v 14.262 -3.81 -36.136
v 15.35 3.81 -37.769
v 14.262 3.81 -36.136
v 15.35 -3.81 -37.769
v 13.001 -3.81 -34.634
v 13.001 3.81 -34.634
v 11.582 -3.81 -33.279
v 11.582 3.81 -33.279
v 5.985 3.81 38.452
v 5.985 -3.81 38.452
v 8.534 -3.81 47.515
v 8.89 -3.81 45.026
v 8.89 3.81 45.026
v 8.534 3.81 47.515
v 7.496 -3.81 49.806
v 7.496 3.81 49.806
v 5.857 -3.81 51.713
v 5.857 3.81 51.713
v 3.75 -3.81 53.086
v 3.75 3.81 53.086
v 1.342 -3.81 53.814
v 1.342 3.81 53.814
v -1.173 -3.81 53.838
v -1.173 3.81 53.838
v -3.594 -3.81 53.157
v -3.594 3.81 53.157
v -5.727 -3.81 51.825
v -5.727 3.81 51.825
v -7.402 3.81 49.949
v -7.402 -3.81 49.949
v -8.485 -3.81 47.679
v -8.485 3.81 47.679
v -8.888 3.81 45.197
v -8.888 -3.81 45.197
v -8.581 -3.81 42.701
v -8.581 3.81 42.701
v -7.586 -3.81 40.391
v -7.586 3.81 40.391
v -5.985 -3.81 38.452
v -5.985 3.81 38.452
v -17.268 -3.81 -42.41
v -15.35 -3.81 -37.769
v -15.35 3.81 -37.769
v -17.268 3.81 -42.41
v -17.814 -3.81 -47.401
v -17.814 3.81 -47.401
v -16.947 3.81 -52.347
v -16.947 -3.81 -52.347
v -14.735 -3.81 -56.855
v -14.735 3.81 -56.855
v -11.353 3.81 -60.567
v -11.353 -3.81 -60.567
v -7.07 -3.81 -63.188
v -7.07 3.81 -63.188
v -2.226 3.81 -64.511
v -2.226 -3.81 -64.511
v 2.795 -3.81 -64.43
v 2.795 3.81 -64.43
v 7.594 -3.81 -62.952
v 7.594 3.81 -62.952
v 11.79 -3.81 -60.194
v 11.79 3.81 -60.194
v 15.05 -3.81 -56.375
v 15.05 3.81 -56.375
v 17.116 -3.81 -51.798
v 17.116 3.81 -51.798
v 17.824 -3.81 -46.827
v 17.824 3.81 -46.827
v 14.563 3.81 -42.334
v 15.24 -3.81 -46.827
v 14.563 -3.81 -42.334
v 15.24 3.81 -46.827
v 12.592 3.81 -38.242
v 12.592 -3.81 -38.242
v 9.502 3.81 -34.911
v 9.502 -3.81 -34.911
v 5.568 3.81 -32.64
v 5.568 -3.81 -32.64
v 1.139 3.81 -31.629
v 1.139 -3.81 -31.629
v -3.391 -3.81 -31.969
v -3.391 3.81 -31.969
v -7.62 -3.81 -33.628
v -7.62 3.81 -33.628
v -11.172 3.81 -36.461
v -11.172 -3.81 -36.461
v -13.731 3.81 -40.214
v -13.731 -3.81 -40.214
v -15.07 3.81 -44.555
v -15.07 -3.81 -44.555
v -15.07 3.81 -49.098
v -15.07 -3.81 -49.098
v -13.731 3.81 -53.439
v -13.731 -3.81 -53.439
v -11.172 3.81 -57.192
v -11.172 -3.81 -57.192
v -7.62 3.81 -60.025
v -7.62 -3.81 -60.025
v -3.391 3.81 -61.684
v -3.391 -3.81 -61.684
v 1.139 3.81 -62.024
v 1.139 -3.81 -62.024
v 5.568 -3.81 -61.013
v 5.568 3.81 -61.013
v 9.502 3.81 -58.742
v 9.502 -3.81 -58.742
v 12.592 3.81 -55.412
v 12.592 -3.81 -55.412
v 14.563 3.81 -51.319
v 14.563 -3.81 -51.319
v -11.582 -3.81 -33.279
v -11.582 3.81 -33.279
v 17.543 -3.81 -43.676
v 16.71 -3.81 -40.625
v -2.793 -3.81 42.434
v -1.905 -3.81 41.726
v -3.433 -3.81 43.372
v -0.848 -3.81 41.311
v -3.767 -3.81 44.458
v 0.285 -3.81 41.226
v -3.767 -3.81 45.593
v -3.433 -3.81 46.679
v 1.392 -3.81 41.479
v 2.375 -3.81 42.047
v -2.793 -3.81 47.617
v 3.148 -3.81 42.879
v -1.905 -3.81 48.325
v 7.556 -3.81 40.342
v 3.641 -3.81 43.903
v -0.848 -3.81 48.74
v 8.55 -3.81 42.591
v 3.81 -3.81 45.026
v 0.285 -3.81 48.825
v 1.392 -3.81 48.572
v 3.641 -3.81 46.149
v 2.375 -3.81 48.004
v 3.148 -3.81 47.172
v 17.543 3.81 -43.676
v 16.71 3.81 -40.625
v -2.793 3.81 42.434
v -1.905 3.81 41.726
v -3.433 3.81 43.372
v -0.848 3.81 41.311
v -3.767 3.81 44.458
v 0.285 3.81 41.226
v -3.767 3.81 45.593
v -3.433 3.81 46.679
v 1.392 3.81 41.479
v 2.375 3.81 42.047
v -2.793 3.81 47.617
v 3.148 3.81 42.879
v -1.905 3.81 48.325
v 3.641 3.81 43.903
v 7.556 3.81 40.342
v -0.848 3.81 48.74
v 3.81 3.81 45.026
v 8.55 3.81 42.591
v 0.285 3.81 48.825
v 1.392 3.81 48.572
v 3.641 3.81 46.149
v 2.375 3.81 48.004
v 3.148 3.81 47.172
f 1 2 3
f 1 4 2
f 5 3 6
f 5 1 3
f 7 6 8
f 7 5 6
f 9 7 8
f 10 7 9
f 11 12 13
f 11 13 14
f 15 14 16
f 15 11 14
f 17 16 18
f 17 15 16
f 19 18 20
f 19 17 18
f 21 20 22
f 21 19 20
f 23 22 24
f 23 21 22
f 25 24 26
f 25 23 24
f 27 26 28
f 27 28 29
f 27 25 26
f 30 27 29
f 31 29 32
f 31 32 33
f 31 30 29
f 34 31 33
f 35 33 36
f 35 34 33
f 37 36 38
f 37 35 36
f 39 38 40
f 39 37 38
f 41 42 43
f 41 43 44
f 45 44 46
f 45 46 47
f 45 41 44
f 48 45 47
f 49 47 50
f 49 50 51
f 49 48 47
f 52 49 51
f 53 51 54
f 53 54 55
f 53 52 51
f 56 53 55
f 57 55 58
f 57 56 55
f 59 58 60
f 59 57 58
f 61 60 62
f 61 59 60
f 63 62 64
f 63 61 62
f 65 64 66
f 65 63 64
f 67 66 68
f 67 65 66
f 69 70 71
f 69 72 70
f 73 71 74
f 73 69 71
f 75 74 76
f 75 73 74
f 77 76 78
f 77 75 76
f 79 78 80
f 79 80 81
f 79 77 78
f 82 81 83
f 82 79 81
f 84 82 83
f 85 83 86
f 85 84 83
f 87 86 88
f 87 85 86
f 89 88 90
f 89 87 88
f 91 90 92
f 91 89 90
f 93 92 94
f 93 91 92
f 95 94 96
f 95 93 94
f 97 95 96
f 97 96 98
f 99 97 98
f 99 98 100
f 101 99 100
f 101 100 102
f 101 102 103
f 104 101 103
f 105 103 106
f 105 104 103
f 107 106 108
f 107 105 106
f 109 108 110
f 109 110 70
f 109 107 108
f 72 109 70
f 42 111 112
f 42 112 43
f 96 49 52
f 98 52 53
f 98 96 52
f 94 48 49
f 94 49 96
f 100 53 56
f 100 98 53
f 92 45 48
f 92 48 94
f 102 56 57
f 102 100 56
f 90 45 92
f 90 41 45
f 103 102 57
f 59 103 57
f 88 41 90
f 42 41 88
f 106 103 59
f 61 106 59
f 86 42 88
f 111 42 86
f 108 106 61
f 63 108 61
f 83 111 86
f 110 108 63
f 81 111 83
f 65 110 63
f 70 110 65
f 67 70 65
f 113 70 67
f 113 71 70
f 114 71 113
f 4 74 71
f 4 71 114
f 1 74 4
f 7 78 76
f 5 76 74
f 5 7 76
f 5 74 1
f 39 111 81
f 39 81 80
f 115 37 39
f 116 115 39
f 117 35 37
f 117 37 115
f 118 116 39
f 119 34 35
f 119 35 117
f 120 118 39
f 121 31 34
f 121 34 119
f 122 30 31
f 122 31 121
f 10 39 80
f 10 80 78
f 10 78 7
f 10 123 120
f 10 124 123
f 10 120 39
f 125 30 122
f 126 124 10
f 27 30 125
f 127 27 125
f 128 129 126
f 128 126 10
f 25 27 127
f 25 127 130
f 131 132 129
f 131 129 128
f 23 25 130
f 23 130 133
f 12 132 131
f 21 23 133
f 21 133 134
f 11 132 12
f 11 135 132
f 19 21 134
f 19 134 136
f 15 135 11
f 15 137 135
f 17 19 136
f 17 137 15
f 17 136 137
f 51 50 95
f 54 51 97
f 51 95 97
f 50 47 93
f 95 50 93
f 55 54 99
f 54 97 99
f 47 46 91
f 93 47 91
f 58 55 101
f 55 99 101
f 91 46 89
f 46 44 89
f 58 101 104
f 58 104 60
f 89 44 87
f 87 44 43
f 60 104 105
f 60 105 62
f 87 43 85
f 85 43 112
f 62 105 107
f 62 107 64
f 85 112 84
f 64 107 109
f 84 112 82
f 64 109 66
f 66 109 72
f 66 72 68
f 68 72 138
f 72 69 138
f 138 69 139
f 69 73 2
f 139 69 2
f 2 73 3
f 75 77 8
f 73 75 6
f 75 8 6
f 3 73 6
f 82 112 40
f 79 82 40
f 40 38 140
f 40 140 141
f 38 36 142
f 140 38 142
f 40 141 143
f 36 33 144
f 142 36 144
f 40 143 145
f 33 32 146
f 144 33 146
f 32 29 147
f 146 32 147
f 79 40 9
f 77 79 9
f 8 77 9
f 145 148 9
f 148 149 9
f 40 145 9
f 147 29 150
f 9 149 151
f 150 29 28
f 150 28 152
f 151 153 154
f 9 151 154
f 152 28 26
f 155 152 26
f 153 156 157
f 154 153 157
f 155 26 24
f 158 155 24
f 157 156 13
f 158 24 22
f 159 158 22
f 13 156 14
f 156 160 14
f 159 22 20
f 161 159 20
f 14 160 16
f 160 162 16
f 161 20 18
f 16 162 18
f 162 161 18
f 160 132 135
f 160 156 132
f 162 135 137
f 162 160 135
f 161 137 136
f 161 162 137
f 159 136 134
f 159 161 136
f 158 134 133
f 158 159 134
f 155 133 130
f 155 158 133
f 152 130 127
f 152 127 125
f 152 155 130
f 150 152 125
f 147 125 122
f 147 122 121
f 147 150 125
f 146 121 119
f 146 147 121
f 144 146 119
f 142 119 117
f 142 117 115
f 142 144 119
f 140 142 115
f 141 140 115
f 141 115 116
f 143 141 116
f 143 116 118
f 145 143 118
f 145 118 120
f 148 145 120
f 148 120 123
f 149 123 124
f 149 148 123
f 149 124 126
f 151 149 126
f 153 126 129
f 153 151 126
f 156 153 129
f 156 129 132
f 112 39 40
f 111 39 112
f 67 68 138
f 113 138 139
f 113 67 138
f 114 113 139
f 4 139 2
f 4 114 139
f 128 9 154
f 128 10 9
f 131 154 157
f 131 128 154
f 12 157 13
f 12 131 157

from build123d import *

# Parameters (mm, degrees)
F0_R     = 3.81
F0_R_2   = 15.24
F1_DEPTH = 3.81


with BuildPart() as f1:
    # F0 (on Front) → F1 (new body, symmetric)
    with BuildSketch(Plane.XZ):
        with BuildLine():
            ThreePointArc((5.984613, 38.451618), (8.131276, 41.431877), (8.89, 45.025544))
            ThreePointArc((8.89, 45.025544), (-3.593667, 53.156821), (-5.984613, 38.451618))
            Line((-5.984613, 38.451618), (5.984613, 38.451618))
        make_face()
        with Locations((0, 45.025544)):
            Circle(F0_R, mode=Mode.SUBTRACT)
        with BuildLine():
            ThreePointArc((5.984613, 38.451618), (0, 36.135544), (-5.984613, 38.451618))
            Line((-5.984613, 38.451618), (-11.581744, -33.278676))
            ThreePointArc((-11.581744, -33.278676), (0, -29.002925), (11.581744, -33.278676))
            Line((11.581744, -33.278676), (5.984613, 38.451618))
        make_face()
        with BuildLine():
            Line((5.984613, 38.451618), (-5.984613, 38.451618))
            ThreePointArc((-5.984613, 38.451618), (0, 36.135544), (5.984613, 38.451618))
        make_face()
        with BuildLine():
            ThreePointArc((17.823636, -46.826562), (17.194227, -42.131822), (15.350451, -37.768654))
            ThreePointArc((15.350451, -37.768654), (13.651951, -35.367667), (11.581744, -33.278676))
            ThreePointArc((11.581744, -33.278676), (0, -29.002925), (-11.581744, -33.278676))
            Line((-11.581744, -33.278676), (-15.350451, -37.768654))
            ThreePointArc((-15.350451, -37.768654), (-4.69474, -64.020789), (17.823636, -46.826562))
        make_face()
        with Locations((0, -46.826562)):
            Circle(F0_R_2, mode=Mode.SUBTRACT)
    extrude(amount=F1_DEPTH, both=True)


solid = f1.part
